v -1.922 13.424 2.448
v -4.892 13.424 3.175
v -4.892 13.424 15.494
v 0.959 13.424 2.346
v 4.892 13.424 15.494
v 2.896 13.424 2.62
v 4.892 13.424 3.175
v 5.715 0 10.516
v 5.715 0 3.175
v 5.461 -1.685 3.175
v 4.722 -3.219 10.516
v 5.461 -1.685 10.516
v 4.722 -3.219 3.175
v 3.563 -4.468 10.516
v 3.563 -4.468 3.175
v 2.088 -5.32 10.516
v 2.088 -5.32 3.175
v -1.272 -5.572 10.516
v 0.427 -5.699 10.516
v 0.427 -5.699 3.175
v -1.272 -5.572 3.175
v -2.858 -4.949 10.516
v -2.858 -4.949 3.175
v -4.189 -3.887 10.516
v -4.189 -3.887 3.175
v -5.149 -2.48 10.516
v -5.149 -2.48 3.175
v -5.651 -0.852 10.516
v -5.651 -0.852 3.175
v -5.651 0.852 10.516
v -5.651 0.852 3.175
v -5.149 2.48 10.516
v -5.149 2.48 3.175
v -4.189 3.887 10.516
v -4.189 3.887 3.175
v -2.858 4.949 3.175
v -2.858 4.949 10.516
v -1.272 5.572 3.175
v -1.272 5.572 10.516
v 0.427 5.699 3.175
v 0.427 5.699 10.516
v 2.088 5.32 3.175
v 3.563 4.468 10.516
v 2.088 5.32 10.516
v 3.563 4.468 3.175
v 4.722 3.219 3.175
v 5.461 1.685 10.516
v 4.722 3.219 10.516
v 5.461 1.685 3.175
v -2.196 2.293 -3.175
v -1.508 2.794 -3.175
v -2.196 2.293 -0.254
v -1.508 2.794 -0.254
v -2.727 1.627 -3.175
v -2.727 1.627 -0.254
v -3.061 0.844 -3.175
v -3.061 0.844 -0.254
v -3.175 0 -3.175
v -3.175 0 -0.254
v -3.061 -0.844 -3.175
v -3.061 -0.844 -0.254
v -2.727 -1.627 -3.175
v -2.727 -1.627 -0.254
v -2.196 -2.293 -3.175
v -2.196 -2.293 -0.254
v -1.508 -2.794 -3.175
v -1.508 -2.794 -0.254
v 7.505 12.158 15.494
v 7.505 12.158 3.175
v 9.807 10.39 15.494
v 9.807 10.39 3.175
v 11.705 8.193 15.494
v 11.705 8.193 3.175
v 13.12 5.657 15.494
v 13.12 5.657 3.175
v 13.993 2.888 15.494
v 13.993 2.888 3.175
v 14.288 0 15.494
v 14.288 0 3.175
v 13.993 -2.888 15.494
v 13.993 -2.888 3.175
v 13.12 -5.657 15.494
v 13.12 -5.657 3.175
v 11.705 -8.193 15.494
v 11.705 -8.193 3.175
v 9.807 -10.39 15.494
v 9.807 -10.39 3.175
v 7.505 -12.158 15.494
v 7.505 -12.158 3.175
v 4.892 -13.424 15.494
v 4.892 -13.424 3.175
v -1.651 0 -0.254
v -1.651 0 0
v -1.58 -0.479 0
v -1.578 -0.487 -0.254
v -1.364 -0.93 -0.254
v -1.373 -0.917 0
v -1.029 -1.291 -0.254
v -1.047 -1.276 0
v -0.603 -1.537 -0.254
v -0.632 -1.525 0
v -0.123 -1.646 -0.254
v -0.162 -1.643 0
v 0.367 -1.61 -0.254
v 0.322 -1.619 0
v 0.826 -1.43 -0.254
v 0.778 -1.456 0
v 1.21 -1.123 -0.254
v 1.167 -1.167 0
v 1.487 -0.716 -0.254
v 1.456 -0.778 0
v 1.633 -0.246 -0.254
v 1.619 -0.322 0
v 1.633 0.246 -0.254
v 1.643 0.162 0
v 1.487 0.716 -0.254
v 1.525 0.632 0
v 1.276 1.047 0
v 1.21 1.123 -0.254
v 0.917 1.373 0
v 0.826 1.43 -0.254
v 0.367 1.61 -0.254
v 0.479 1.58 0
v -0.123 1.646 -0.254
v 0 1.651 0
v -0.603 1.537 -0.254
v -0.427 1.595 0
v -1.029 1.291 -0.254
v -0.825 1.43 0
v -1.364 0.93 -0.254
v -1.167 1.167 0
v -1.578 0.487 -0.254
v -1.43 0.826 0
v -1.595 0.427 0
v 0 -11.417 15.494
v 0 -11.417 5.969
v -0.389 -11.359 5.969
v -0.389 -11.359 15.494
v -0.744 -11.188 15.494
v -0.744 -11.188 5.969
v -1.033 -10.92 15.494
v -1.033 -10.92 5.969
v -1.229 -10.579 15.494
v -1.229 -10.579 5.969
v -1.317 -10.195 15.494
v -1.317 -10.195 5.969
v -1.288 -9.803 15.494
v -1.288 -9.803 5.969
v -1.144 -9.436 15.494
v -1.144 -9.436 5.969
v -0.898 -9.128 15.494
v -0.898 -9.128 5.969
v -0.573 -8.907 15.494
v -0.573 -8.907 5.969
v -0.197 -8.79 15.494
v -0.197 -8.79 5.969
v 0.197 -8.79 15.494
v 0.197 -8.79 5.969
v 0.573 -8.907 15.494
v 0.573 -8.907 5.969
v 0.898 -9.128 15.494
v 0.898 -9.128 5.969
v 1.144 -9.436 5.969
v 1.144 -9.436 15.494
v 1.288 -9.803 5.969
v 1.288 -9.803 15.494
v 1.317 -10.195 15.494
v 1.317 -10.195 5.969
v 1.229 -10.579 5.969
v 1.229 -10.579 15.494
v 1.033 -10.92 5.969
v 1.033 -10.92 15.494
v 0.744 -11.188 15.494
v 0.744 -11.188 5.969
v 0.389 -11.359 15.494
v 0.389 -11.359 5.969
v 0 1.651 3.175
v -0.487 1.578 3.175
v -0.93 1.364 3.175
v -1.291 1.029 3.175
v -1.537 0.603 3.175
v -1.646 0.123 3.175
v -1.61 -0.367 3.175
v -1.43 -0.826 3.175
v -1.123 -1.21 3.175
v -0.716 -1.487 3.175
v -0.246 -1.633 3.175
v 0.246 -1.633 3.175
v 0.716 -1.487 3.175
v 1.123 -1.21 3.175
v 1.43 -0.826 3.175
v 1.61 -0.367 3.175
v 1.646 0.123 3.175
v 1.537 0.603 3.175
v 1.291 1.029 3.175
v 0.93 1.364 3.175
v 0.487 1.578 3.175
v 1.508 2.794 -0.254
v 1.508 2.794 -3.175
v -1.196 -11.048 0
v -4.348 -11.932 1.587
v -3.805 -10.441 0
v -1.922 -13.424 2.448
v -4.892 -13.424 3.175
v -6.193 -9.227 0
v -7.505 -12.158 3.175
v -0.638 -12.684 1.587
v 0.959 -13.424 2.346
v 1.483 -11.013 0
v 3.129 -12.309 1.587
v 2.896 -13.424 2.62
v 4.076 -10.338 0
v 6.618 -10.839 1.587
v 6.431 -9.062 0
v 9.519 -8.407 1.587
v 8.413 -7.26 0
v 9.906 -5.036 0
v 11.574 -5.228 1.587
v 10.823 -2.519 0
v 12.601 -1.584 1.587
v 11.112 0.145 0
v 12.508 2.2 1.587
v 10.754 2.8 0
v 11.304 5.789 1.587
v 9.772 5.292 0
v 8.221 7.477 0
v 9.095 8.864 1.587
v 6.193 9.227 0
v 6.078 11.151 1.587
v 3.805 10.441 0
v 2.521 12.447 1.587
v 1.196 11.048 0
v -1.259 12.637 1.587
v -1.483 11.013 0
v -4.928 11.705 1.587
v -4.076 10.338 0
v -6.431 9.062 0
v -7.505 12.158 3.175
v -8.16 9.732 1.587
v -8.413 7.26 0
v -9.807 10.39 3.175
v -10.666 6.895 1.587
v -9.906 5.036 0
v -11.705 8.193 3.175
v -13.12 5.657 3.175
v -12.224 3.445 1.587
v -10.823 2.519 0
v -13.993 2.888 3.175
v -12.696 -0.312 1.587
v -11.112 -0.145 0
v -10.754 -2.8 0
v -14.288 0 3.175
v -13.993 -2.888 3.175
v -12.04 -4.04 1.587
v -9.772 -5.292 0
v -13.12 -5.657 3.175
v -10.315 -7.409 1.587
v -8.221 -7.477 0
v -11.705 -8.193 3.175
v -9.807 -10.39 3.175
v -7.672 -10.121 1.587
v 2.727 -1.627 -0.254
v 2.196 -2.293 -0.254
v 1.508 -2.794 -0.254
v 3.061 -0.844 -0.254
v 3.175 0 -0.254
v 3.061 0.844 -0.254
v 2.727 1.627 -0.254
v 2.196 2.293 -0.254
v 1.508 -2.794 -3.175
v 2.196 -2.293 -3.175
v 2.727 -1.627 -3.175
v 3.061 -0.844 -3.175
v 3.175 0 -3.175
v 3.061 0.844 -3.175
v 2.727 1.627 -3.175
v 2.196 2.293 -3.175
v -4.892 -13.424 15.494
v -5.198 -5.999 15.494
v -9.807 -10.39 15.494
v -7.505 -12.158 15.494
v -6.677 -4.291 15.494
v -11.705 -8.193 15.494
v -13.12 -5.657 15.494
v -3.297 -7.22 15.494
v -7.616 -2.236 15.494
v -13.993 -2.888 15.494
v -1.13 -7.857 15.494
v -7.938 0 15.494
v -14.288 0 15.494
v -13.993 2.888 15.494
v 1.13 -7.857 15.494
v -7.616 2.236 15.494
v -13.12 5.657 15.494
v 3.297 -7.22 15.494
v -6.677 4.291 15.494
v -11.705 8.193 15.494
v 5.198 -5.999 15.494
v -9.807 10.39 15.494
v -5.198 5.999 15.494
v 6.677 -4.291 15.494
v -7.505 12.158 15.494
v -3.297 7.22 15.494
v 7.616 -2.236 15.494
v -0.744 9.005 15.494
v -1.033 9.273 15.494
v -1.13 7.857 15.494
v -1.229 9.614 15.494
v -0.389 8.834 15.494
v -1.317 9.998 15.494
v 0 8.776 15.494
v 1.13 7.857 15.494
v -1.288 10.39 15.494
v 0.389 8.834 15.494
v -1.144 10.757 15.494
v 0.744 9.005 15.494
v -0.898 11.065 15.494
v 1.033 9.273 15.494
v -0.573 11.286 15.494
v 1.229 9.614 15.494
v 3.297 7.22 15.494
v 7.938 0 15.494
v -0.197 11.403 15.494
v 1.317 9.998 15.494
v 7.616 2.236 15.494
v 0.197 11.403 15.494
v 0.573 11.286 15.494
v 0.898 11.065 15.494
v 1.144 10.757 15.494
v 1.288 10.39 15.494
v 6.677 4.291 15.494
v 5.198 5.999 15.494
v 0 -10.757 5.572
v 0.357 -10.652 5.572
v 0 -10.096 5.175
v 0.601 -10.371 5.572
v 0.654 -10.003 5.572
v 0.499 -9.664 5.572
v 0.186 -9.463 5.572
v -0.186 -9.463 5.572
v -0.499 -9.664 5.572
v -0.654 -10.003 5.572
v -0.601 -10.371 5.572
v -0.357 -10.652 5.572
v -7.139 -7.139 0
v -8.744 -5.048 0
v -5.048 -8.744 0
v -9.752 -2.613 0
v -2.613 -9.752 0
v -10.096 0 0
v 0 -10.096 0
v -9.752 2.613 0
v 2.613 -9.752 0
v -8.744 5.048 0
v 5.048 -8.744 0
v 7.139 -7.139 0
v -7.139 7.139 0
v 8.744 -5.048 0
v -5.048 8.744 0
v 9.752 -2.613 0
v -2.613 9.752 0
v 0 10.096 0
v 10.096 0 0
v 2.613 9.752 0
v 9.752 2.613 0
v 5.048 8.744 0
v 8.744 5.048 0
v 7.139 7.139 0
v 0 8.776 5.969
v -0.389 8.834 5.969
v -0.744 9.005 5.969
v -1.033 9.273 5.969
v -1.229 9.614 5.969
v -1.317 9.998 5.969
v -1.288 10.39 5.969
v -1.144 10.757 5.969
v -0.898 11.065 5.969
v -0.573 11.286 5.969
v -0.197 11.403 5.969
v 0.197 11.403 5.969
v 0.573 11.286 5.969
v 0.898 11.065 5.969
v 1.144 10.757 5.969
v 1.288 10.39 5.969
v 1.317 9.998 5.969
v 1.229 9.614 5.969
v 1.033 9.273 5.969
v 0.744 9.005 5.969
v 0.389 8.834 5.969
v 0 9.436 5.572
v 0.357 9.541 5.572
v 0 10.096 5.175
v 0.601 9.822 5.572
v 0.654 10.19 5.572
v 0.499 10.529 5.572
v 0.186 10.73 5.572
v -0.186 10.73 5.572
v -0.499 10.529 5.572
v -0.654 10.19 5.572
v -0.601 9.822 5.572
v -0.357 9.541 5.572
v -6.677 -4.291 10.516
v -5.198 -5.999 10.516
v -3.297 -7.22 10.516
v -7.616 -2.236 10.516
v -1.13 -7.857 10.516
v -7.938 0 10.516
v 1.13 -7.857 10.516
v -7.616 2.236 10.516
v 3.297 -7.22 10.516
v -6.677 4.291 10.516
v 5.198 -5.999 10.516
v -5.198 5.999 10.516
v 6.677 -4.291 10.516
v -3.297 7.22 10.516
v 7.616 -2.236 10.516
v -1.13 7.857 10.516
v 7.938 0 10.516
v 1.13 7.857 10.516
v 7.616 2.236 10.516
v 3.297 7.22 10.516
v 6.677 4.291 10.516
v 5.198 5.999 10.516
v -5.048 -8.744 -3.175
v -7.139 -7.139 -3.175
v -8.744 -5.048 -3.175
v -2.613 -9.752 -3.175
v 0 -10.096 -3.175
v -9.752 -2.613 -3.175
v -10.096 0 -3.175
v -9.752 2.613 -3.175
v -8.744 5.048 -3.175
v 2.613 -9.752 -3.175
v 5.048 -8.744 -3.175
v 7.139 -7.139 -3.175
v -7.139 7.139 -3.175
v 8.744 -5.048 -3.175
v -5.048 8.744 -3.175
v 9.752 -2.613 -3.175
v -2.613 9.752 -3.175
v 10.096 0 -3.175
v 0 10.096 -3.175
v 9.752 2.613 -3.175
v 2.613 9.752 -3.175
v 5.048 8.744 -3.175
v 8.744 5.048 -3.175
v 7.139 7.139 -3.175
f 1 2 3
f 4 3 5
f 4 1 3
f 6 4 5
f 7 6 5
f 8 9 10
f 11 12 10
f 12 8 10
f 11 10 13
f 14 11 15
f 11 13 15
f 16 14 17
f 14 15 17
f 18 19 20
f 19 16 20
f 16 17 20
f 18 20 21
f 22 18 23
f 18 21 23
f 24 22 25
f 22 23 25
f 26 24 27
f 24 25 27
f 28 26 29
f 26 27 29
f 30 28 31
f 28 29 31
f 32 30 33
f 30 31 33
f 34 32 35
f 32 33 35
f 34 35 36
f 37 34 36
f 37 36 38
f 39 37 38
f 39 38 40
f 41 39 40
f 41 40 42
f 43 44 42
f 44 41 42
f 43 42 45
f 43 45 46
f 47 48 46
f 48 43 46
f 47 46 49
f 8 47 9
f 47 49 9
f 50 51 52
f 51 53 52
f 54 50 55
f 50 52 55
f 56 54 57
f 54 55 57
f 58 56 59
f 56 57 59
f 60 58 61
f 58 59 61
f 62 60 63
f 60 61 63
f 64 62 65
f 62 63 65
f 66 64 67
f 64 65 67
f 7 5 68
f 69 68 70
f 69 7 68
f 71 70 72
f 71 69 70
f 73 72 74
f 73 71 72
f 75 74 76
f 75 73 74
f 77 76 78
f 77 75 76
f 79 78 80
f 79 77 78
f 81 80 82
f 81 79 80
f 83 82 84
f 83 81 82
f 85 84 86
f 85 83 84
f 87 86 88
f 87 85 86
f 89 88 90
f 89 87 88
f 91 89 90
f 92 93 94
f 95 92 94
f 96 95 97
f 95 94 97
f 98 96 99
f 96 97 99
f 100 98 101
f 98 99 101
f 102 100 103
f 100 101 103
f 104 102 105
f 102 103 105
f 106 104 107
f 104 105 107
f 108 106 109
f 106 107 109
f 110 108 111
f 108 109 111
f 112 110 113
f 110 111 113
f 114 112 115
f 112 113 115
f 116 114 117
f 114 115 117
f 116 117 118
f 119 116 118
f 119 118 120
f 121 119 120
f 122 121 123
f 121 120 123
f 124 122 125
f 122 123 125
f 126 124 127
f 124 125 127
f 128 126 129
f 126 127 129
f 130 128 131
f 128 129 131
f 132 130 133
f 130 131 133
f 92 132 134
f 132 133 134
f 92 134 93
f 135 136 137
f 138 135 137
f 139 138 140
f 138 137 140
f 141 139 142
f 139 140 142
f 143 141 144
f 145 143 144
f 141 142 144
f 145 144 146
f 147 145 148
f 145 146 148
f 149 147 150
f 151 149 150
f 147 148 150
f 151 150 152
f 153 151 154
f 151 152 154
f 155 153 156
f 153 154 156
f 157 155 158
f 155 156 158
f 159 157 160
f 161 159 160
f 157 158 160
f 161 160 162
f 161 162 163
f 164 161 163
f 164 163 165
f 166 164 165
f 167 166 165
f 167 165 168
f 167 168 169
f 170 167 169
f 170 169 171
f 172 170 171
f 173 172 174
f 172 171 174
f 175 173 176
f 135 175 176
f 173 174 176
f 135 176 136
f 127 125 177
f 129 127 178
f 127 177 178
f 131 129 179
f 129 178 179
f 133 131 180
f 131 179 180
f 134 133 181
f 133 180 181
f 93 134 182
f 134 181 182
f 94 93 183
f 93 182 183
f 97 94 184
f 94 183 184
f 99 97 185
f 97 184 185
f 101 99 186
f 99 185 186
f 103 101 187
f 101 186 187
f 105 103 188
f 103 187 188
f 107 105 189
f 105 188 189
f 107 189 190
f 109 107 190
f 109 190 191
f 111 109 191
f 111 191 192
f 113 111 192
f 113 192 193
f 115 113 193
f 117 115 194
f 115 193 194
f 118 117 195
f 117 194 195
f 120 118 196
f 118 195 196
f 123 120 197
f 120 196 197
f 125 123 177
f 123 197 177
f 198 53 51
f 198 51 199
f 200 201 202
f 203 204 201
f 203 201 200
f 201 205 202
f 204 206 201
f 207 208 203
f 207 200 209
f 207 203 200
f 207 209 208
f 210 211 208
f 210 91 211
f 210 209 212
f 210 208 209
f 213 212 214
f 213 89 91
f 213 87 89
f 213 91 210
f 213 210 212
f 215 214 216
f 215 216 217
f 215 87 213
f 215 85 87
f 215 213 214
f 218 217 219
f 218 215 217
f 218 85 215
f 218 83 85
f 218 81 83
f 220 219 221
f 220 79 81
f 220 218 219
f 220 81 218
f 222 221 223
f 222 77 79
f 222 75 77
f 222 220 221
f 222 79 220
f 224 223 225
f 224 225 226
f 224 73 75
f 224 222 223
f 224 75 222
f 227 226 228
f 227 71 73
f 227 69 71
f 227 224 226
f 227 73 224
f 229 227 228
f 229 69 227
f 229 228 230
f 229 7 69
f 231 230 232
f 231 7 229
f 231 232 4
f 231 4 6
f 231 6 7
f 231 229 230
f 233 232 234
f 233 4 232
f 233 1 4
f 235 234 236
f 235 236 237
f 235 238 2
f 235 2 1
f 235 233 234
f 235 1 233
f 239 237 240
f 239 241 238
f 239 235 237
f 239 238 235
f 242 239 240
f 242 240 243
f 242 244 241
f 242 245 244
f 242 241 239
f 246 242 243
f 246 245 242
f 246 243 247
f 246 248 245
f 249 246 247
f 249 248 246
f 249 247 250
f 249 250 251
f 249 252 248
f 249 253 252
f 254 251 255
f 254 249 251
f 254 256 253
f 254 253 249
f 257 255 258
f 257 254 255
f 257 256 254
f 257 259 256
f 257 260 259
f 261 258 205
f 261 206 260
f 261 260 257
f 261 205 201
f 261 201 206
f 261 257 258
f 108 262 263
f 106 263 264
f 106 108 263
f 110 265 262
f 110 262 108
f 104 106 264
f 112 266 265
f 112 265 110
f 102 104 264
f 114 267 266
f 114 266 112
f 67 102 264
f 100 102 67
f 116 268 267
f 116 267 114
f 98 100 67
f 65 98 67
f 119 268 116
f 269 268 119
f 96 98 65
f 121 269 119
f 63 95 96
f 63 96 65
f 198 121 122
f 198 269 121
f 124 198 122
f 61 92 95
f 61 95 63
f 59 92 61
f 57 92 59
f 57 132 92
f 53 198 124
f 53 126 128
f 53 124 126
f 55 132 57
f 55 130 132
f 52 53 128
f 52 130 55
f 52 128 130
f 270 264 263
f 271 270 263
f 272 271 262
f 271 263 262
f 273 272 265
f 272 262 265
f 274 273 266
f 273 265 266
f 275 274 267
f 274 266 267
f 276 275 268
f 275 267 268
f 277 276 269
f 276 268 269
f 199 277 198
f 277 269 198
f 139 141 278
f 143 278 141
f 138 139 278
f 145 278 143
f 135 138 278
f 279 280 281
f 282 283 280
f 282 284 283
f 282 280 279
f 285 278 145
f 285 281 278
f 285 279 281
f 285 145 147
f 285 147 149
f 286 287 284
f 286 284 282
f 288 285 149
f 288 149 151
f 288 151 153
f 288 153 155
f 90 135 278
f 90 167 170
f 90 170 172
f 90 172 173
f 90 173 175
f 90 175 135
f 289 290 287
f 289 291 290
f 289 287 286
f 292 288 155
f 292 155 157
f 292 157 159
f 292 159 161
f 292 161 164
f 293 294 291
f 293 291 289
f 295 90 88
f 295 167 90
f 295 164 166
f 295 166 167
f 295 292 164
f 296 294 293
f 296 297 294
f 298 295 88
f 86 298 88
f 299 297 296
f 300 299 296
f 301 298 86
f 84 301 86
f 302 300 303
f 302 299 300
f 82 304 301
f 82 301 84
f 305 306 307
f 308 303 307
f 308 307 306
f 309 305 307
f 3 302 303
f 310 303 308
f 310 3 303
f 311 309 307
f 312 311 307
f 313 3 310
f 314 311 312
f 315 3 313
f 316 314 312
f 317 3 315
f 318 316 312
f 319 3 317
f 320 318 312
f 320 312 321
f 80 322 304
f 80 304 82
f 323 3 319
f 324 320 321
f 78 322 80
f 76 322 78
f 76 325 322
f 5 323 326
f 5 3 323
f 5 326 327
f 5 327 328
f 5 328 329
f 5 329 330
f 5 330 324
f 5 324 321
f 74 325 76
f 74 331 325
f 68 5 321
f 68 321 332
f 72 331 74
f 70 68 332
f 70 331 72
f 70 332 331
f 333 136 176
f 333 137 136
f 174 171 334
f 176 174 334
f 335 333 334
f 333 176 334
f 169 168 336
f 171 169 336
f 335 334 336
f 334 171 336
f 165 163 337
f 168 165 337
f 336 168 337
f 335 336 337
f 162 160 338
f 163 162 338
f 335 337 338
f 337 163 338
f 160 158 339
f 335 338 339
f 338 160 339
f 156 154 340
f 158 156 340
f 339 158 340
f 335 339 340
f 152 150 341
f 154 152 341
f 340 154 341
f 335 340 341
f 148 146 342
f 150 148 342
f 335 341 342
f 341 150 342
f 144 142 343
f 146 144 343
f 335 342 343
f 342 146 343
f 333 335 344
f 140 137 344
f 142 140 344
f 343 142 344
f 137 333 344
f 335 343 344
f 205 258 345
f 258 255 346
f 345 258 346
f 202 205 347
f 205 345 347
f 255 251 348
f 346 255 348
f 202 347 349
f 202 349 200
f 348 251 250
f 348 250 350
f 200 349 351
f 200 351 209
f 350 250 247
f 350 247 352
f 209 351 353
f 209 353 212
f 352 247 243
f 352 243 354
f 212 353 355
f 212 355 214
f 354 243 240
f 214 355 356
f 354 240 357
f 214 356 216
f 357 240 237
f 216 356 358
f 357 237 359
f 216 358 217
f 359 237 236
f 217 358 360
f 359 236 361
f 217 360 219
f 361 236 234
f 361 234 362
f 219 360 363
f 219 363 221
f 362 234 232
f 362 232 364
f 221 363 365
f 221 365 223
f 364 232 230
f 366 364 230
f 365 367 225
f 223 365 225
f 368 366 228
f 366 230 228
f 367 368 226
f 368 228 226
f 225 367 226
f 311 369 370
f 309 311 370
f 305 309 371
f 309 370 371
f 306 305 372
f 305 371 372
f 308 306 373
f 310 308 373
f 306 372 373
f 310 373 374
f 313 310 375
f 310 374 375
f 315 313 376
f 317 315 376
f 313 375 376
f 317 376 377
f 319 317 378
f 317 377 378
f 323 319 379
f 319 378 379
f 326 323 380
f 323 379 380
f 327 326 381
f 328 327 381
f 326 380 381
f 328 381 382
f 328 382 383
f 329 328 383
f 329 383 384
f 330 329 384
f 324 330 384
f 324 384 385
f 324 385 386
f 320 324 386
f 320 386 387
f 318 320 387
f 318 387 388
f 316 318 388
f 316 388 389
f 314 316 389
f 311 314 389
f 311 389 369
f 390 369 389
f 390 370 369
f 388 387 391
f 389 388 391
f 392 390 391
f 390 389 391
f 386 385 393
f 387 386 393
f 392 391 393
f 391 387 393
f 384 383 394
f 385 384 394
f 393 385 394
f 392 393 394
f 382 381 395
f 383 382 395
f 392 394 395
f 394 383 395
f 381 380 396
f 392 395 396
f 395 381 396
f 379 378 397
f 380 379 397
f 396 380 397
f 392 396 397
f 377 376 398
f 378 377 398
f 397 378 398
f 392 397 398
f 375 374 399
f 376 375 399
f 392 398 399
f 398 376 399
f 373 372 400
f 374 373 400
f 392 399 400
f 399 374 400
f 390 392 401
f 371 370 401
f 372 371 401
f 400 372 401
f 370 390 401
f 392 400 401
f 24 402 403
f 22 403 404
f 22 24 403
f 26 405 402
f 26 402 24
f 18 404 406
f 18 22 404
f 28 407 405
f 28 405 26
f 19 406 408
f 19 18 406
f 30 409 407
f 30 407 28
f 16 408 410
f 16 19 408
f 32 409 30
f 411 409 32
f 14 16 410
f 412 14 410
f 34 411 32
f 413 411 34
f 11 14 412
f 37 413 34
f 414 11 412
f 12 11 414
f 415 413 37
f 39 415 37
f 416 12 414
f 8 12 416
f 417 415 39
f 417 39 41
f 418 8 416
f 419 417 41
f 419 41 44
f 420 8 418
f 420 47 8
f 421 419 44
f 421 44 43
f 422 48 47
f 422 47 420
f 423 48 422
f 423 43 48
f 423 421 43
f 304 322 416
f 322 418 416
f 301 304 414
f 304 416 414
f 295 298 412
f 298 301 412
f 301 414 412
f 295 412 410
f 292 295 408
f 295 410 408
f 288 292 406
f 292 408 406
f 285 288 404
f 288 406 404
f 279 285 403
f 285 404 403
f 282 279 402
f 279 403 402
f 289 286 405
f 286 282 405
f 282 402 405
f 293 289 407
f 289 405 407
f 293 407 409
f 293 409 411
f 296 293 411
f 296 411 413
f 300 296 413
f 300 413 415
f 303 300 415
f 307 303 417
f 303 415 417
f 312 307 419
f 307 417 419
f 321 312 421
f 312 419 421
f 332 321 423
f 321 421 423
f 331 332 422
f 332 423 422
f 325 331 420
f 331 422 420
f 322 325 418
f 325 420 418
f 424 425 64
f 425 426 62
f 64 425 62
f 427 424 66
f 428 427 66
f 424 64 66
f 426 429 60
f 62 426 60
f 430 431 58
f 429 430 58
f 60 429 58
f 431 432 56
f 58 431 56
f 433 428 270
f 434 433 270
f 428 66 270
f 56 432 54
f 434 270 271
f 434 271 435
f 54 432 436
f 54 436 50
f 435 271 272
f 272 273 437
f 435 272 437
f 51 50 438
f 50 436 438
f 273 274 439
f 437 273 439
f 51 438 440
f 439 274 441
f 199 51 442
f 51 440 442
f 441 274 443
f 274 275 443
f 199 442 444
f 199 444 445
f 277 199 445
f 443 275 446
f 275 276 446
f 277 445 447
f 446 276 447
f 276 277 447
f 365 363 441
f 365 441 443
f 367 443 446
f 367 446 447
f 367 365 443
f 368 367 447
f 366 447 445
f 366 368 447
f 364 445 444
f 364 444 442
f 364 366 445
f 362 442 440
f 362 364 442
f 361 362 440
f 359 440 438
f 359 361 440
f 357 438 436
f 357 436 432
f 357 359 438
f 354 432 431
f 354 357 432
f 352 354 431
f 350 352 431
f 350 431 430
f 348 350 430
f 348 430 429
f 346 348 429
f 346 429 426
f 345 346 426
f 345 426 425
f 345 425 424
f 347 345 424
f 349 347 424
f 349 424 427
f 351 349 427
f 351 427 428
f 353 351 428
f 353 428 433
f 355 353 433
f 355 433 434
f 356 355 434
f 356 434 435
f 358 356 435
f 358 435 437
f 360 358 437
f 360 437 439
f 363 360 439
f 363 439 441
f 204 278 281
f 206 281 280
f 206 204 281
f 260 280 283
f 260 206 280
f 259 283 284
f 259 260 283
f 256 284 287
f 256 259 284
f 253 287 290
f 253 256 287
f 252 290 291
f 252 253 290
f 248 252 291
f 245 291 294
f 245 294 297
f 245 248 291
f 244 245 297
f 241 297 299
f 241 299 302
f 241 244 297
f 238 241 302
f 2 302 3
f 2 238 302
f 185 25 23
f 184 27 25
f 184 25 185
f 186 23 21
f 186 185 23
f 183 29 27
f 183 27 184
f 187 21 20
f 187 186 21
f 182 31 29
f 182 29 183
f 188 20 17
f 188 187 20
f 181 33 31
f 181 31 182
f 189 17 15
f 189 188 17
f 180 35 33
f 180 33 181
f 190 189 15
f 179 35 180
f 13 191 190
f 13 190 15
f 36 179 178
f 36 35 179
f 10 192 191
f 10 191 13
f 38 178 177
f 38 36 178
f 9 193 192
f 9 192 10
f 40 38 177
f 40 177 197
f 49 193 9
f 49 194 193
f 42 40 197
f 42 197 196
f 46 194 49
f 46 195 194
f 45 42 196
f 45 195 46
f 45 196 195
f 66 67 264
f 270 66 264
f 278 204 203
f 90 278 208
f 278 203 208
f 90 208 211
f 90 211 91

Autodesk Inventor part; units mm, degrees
ref_plane "YZ Plane" through (0, 0, 0) normal (1, 0, 0) x (0, 1, 0)
ref_plane "XZ Plane" through (0, 0, 0) normal (0, 1, 0) x (-1, 0, 0)
ref_plane "XY Plane" through (0, 0, 0) normal (0, 0, 1) x (1, 0, 0)
sketch "Sketch1" plane through (0, 0, 0) normal (0, 0, 1) x (1, 0, 0)
  circle A0 centre (0, 0) radius 3.175
  line L0 (-1.508, 2.794) -> (1.508, 2.794)
  line L1 (-3.175, 0) -> (0, 0)
  line L2 (0, 0) -> (3.175, 0)
  line L3 (-1.508, -2.794) -> (1.508, -2.794)
  circle A1 centre (0, 0) radius 7.9375
  arc A2 (-4.892, 13.4239) -> (-4.892, -13.4239) centre (0, 0) ccw
  circle A3 centre (0, 10.0965) radius 1.905 construction
  circle A4 centre (0, 10.0965) radius 3.3274 construction
  circle A5 centre (0, 0) radius 10.0965
  line L4 (0, 0) -> (0, 10.0965) construction
  line L5 (0, -10.0965) -> (0, 0) construction
  line L6 (-4.892, 13.4239) -> (4.892, 13.4239)
  arc A6 (4.892, 13.4239) -> (-4.892, 13.4239) centre (0, 0) ccw
  circle A7 centre (0, -10.0965) radius 3.3274 construction
  line L7 (-4.892, -13.4239) -> (4.892, -13.4239)
  arc A8 (4.892, -13.4239) -> (4.892, 13.4239) centre (0, 0) ccw
  arc A9 (-4.892, -13.4239) -> (4.892, -13.4239) centre (0, 0) ccw
  dimension "d0" = 6.35
  dimension "d1" = 5.588
  dimension "d2" = 15.875
  dimension "d4" = 3.81
  dimension "d5" = 6.6548
  dimension "d7" = 2.159
  dimension "d8" = 14.2875
extrude "Extrusion1" add sketch "Sketch1" along normal blind 15.494 contours L6 A8 L7 A2 | A6 L6 | L7 A9 | A5
extrude "Extrusion2" add sketch "Sketch1" against normal blind 3.175 contours L0 A0 | A0 L3 | A1 | A5
extrude "Extrusion3" add sketch "Sketch1" along normal blind 3.175 contours L2 L1 A0 L0 | A0 L3 L1 L2 | L0 A0 | A0 L3 | A1
hole "Hole1" at (0, 0, 0) direction (0, 0, 1) diameter 3.302 end through all thread size "8-32 UNC" class "2B" standard "ANSI Unified Screw Threads"
sketch "Sketch2" plane through (0, 0, 3.175) normal (0, 0, 1) x (1, 0, 0)
  circle A0 centre (0, 0) radius 7.9375 projected
  circle A1 centre (0, 0) radius 3.429 construction
  circle A2 centre (0, 0) radius 5.715
  dimension "d22" = 6.858
  dimension "d23" = 11.43
extrude "Extrusion4" add sketch "Sketch2" along normal blind 7.3406
sketch "Sketch3" plane through (0, 0, 15.494) normal (0, 0, 1) x (1, 0, 0)
  point P0 (0, -10.0965)
  point P1 (0, 10.0965)
hole "Hole2" at (0, 10.0965, 15.494) at (0, -10.0965, 15.494) direction (0, 0, -1) diameter 2.6416 depth 9.525 tip angle 118 thread size "6-32 UNC" class "2B" standard "ANSI Unified Screw Threads"
chamfer "Chamfer2" distance 3.175 angle 45 1 edges at (-4.892, 13.4239, 0)
extrude "Extrusion5" cut sketch "Sketch1" along normal up to surface (15.494 mm away) contours A6 L6 | L7 A9
sketch "Sketch4" plane through (0, 0, 0) normal (0, 0, -1) x (-1, 0, 0)
  circle A0 centre (0, 0) radius 1.651 projected
  line L0 (1.508, 2.794) -> (-1.508, 2.794) projected
  arc A1 (-1.508, 2.794) -> (-1.508, -2.794) centre (0, 0) ccw projected
  line L1 (-1.508, -2.794) -> (1.508, -2.794) projected
  arc A2 (1.508, -2.794) -> (1.508, 2.794) centre (0, 0) ccw projected
extrude "Extrusion6" add sketch "Sketch4" along normal blind 0.254
properties part number "Pnuematic Connector"
